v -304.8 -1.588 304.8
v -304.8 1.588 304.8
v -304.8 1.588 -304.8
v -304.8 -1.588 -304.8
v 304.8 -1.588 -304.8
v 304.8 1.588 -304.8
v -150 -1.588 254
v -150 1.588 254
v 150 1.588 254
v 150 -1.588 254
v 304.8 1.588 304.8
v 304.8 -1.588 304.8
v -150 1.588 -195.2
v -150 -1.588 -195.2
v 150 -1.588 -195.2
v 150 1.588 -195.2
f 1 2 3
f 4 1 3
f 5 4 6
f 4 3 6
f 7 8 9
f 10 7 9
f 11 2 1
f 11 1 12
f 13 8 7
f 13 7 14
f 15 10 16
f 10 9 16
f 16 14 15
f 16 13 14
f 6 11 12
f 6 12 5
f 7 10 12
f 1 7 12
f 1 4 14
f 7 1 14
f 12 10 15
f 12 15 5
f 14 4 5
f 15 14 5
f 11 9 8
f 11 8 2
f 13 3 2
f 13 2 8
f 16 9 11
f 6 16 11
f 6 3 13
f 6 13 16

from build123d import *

# Parameters (mm, degrees)
SKETCH1_W           = 609.6
SKETCH1_H           = 609.6
SKETCH1_W_2         = 300
SKETCH1_H_2         = 449.2
BOSS_EXTRUDE1_DEPTH = 1.5875


with BuildPart() as part:
    # Sketch1 → Boss-Extrude1 (new body, symmetric)
    with BuildSketch(Plane(origin=(0, 0, 0), x_dir=(1, 0, 0), z_dir=(0, 1, 0))):
        Rectangle(SKETCH1_W, SKETCH1_H)
        with Locations((0, -29.4)):
            Rectangle(SKETCH1_W_2, SKETCH1_H_2, mode=Mode.SUBTRACT)
    extrude(amount=BOSS_EXTRUDE1_DEPTH, both=True)


solid = part.part
